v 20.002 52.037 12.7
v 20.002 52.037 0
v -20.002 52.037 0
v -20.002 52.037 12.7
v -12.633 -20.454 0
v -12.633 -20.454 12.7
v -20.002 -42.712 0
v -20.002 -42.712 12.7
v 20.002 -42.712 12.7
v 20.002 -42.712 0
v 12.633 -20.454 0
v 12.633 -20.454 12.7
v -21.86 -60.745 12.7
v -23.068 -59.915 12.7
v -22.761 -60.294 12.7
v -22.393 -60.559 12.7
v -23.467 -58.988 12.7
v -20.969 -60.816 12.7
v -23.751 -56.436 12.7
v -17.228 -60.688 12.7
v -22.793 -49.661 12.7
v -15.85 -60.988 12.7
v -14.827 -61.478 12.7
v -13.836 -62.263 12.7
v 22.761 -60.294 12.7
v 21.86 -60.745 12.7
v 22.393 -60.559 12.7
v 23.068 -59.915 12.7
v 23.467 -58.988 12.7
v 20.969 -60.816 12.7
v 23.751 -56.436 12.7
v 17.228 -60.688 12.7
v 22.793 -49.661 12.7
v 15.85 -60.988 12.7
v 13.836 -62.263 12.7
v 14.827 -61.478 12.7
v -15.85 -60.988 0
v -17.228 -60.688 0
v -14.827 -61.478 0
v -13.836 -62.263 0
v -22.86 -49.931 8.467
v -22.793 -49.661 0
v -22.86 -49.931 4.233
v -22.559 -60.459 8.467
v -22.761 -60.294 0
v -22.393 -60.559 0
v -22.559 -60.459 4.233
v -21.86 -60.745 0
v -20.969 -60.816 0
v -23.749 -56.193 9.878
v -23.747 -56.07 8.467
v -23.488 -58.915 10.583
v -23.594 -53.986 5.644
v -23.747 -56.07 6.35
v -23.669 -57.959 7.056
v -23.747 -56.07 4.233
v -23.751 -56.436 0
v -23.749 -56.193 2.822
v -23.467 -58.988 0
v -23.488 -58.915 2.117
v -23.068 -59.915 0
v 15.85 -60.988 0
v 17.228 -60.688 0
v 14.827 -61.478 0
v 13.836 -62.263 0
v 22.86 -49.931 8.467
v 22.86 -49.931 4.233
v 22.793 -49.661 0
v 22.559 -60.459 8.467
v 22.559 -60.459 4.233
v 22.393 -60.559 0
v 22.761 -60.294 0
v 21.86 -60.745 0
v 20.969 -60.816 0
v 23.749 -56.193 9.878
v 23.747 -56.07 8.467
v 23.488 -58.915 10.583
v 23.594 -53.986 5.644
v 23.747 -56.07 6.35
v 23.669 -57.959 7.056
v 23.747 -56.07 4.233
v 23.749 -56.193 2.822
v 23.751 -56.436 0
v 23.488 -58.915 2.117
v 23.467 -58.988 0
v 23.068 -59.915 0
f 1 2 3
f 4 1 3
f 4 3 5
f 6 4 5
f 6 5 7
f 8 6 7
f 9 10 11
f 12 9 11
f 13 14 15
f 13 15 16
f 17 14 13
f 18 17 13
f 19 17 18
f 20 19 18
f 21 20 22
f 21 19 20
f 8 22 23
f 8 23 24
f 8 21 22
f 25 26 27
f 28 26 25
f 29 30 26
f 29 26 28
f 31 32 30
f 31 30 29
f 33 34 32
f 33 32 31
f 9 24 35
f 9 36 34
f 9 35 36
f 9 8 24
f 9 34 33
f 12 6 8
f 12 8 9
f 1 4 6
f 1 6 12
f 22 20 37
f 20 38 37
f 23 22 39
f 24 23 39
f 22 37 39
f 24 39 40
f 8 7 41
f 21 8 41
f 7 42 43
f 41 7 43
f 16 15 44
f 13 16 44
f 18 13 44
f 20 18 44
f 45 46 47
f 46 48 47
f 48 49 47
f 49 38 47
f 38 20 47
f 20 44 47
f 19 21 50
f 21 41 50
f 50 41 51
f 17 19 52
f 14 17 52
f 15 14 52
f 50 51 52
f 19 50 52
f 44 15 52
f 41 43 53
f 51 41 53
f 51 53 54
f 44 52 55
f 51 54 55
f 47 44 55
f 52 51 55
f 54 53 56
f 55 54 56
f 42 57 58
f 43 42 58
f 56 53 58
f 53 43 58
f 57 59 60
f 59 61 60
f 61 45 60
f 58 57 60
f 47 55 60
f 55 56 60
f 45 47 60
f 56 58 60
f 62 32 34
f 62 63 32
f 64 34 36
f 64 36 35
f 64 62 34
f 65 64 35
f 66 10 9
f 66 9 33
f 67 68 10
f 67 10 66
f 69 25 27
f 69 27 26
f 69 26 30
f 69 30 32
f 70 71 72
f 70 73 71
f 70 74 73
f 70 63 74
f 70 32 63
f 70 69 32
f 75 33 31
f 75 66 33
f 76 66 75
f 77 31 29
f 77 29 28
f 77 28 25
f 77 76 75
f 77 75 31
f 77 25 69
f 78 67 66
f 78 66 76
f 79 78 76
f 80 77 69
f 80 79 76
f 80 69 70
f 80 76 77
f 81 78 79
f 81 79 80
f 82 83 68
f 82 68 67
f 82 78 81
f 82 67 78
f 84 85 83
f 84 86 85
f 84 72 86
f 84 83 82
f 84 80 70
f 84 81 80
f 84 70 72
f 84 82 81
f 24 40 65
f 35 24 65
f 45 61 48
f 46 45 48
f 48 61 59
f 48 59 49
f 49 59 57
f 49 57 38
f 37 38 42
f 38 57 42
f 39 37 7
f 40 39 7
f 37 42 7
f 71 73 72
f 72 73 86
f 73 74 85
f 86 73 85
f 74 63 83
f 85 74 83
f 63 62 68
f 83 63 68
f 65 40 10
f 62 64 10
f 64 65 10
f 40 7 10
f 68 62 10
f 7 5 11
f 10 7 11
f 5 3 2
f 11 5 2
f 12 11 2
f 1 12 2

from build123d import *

# Parameters (mm, degrees)
F1_DEPTH = 12.7


with BuildPart() as f1:
    # F0 (on Top) → F1 (new body)
    with BuildSketch(Plane.XY):
        with BuildLine():
            Line((0, 52.0365796983), (-20.0025, 52.0365796983))
            Line((-20.0025, 52.0365796983), (-12.633157894, -20.4536858946))
            Line((-12.633157894, -20.4536858946), (-20.0025, -42.7121035755))
            add(Edge.make_bspline(
                [(-20.0025, -42.7121035755), (-21.1866346696, -45.1468080489), (-23.1579199792, -48.7548194432), (-25.0683852323, -64.3099806953), (-16.9383073123, -59.2079587227), (-13.8363149017, -62.2634203017)],
                knots=[0, 0, 0, 0, 0.3090403224, 0.6689788708, 1, 1, 1, 1], degree=3))
            Line((-13.8363149017, -62.2634203017), (0, -62.2634203017))
            Line((0, -62.2634203017), (13.8363149017, -62.2634203017))
            add(Edge.make_bspline(
                [(20.0025, -42.7121035755), (21.1866346696, -45.1468080489), (23.1579199792, -48.7548194432), (25.0683852323, -64.3099806953), (16.9383073123, -59.2079587227), (13.8363149017, -62.2634203017)],
                knots=[0, 0, 0, 0, 0.3090403224, 0.6689788708, 1, 1, 1, 1], degree=3))
            Line((20.0025, -42.7121035755), (12.633157894, -20.4536858946))
            Line((12.633157894, -20.4536858946), (20.0025, 52.0365796983))
            Line((20.0025, 52.0365796983), (0, 52.0365796983))
        make_face()
    extrude(amount=F1_DEPTH)


solid = f1.part
